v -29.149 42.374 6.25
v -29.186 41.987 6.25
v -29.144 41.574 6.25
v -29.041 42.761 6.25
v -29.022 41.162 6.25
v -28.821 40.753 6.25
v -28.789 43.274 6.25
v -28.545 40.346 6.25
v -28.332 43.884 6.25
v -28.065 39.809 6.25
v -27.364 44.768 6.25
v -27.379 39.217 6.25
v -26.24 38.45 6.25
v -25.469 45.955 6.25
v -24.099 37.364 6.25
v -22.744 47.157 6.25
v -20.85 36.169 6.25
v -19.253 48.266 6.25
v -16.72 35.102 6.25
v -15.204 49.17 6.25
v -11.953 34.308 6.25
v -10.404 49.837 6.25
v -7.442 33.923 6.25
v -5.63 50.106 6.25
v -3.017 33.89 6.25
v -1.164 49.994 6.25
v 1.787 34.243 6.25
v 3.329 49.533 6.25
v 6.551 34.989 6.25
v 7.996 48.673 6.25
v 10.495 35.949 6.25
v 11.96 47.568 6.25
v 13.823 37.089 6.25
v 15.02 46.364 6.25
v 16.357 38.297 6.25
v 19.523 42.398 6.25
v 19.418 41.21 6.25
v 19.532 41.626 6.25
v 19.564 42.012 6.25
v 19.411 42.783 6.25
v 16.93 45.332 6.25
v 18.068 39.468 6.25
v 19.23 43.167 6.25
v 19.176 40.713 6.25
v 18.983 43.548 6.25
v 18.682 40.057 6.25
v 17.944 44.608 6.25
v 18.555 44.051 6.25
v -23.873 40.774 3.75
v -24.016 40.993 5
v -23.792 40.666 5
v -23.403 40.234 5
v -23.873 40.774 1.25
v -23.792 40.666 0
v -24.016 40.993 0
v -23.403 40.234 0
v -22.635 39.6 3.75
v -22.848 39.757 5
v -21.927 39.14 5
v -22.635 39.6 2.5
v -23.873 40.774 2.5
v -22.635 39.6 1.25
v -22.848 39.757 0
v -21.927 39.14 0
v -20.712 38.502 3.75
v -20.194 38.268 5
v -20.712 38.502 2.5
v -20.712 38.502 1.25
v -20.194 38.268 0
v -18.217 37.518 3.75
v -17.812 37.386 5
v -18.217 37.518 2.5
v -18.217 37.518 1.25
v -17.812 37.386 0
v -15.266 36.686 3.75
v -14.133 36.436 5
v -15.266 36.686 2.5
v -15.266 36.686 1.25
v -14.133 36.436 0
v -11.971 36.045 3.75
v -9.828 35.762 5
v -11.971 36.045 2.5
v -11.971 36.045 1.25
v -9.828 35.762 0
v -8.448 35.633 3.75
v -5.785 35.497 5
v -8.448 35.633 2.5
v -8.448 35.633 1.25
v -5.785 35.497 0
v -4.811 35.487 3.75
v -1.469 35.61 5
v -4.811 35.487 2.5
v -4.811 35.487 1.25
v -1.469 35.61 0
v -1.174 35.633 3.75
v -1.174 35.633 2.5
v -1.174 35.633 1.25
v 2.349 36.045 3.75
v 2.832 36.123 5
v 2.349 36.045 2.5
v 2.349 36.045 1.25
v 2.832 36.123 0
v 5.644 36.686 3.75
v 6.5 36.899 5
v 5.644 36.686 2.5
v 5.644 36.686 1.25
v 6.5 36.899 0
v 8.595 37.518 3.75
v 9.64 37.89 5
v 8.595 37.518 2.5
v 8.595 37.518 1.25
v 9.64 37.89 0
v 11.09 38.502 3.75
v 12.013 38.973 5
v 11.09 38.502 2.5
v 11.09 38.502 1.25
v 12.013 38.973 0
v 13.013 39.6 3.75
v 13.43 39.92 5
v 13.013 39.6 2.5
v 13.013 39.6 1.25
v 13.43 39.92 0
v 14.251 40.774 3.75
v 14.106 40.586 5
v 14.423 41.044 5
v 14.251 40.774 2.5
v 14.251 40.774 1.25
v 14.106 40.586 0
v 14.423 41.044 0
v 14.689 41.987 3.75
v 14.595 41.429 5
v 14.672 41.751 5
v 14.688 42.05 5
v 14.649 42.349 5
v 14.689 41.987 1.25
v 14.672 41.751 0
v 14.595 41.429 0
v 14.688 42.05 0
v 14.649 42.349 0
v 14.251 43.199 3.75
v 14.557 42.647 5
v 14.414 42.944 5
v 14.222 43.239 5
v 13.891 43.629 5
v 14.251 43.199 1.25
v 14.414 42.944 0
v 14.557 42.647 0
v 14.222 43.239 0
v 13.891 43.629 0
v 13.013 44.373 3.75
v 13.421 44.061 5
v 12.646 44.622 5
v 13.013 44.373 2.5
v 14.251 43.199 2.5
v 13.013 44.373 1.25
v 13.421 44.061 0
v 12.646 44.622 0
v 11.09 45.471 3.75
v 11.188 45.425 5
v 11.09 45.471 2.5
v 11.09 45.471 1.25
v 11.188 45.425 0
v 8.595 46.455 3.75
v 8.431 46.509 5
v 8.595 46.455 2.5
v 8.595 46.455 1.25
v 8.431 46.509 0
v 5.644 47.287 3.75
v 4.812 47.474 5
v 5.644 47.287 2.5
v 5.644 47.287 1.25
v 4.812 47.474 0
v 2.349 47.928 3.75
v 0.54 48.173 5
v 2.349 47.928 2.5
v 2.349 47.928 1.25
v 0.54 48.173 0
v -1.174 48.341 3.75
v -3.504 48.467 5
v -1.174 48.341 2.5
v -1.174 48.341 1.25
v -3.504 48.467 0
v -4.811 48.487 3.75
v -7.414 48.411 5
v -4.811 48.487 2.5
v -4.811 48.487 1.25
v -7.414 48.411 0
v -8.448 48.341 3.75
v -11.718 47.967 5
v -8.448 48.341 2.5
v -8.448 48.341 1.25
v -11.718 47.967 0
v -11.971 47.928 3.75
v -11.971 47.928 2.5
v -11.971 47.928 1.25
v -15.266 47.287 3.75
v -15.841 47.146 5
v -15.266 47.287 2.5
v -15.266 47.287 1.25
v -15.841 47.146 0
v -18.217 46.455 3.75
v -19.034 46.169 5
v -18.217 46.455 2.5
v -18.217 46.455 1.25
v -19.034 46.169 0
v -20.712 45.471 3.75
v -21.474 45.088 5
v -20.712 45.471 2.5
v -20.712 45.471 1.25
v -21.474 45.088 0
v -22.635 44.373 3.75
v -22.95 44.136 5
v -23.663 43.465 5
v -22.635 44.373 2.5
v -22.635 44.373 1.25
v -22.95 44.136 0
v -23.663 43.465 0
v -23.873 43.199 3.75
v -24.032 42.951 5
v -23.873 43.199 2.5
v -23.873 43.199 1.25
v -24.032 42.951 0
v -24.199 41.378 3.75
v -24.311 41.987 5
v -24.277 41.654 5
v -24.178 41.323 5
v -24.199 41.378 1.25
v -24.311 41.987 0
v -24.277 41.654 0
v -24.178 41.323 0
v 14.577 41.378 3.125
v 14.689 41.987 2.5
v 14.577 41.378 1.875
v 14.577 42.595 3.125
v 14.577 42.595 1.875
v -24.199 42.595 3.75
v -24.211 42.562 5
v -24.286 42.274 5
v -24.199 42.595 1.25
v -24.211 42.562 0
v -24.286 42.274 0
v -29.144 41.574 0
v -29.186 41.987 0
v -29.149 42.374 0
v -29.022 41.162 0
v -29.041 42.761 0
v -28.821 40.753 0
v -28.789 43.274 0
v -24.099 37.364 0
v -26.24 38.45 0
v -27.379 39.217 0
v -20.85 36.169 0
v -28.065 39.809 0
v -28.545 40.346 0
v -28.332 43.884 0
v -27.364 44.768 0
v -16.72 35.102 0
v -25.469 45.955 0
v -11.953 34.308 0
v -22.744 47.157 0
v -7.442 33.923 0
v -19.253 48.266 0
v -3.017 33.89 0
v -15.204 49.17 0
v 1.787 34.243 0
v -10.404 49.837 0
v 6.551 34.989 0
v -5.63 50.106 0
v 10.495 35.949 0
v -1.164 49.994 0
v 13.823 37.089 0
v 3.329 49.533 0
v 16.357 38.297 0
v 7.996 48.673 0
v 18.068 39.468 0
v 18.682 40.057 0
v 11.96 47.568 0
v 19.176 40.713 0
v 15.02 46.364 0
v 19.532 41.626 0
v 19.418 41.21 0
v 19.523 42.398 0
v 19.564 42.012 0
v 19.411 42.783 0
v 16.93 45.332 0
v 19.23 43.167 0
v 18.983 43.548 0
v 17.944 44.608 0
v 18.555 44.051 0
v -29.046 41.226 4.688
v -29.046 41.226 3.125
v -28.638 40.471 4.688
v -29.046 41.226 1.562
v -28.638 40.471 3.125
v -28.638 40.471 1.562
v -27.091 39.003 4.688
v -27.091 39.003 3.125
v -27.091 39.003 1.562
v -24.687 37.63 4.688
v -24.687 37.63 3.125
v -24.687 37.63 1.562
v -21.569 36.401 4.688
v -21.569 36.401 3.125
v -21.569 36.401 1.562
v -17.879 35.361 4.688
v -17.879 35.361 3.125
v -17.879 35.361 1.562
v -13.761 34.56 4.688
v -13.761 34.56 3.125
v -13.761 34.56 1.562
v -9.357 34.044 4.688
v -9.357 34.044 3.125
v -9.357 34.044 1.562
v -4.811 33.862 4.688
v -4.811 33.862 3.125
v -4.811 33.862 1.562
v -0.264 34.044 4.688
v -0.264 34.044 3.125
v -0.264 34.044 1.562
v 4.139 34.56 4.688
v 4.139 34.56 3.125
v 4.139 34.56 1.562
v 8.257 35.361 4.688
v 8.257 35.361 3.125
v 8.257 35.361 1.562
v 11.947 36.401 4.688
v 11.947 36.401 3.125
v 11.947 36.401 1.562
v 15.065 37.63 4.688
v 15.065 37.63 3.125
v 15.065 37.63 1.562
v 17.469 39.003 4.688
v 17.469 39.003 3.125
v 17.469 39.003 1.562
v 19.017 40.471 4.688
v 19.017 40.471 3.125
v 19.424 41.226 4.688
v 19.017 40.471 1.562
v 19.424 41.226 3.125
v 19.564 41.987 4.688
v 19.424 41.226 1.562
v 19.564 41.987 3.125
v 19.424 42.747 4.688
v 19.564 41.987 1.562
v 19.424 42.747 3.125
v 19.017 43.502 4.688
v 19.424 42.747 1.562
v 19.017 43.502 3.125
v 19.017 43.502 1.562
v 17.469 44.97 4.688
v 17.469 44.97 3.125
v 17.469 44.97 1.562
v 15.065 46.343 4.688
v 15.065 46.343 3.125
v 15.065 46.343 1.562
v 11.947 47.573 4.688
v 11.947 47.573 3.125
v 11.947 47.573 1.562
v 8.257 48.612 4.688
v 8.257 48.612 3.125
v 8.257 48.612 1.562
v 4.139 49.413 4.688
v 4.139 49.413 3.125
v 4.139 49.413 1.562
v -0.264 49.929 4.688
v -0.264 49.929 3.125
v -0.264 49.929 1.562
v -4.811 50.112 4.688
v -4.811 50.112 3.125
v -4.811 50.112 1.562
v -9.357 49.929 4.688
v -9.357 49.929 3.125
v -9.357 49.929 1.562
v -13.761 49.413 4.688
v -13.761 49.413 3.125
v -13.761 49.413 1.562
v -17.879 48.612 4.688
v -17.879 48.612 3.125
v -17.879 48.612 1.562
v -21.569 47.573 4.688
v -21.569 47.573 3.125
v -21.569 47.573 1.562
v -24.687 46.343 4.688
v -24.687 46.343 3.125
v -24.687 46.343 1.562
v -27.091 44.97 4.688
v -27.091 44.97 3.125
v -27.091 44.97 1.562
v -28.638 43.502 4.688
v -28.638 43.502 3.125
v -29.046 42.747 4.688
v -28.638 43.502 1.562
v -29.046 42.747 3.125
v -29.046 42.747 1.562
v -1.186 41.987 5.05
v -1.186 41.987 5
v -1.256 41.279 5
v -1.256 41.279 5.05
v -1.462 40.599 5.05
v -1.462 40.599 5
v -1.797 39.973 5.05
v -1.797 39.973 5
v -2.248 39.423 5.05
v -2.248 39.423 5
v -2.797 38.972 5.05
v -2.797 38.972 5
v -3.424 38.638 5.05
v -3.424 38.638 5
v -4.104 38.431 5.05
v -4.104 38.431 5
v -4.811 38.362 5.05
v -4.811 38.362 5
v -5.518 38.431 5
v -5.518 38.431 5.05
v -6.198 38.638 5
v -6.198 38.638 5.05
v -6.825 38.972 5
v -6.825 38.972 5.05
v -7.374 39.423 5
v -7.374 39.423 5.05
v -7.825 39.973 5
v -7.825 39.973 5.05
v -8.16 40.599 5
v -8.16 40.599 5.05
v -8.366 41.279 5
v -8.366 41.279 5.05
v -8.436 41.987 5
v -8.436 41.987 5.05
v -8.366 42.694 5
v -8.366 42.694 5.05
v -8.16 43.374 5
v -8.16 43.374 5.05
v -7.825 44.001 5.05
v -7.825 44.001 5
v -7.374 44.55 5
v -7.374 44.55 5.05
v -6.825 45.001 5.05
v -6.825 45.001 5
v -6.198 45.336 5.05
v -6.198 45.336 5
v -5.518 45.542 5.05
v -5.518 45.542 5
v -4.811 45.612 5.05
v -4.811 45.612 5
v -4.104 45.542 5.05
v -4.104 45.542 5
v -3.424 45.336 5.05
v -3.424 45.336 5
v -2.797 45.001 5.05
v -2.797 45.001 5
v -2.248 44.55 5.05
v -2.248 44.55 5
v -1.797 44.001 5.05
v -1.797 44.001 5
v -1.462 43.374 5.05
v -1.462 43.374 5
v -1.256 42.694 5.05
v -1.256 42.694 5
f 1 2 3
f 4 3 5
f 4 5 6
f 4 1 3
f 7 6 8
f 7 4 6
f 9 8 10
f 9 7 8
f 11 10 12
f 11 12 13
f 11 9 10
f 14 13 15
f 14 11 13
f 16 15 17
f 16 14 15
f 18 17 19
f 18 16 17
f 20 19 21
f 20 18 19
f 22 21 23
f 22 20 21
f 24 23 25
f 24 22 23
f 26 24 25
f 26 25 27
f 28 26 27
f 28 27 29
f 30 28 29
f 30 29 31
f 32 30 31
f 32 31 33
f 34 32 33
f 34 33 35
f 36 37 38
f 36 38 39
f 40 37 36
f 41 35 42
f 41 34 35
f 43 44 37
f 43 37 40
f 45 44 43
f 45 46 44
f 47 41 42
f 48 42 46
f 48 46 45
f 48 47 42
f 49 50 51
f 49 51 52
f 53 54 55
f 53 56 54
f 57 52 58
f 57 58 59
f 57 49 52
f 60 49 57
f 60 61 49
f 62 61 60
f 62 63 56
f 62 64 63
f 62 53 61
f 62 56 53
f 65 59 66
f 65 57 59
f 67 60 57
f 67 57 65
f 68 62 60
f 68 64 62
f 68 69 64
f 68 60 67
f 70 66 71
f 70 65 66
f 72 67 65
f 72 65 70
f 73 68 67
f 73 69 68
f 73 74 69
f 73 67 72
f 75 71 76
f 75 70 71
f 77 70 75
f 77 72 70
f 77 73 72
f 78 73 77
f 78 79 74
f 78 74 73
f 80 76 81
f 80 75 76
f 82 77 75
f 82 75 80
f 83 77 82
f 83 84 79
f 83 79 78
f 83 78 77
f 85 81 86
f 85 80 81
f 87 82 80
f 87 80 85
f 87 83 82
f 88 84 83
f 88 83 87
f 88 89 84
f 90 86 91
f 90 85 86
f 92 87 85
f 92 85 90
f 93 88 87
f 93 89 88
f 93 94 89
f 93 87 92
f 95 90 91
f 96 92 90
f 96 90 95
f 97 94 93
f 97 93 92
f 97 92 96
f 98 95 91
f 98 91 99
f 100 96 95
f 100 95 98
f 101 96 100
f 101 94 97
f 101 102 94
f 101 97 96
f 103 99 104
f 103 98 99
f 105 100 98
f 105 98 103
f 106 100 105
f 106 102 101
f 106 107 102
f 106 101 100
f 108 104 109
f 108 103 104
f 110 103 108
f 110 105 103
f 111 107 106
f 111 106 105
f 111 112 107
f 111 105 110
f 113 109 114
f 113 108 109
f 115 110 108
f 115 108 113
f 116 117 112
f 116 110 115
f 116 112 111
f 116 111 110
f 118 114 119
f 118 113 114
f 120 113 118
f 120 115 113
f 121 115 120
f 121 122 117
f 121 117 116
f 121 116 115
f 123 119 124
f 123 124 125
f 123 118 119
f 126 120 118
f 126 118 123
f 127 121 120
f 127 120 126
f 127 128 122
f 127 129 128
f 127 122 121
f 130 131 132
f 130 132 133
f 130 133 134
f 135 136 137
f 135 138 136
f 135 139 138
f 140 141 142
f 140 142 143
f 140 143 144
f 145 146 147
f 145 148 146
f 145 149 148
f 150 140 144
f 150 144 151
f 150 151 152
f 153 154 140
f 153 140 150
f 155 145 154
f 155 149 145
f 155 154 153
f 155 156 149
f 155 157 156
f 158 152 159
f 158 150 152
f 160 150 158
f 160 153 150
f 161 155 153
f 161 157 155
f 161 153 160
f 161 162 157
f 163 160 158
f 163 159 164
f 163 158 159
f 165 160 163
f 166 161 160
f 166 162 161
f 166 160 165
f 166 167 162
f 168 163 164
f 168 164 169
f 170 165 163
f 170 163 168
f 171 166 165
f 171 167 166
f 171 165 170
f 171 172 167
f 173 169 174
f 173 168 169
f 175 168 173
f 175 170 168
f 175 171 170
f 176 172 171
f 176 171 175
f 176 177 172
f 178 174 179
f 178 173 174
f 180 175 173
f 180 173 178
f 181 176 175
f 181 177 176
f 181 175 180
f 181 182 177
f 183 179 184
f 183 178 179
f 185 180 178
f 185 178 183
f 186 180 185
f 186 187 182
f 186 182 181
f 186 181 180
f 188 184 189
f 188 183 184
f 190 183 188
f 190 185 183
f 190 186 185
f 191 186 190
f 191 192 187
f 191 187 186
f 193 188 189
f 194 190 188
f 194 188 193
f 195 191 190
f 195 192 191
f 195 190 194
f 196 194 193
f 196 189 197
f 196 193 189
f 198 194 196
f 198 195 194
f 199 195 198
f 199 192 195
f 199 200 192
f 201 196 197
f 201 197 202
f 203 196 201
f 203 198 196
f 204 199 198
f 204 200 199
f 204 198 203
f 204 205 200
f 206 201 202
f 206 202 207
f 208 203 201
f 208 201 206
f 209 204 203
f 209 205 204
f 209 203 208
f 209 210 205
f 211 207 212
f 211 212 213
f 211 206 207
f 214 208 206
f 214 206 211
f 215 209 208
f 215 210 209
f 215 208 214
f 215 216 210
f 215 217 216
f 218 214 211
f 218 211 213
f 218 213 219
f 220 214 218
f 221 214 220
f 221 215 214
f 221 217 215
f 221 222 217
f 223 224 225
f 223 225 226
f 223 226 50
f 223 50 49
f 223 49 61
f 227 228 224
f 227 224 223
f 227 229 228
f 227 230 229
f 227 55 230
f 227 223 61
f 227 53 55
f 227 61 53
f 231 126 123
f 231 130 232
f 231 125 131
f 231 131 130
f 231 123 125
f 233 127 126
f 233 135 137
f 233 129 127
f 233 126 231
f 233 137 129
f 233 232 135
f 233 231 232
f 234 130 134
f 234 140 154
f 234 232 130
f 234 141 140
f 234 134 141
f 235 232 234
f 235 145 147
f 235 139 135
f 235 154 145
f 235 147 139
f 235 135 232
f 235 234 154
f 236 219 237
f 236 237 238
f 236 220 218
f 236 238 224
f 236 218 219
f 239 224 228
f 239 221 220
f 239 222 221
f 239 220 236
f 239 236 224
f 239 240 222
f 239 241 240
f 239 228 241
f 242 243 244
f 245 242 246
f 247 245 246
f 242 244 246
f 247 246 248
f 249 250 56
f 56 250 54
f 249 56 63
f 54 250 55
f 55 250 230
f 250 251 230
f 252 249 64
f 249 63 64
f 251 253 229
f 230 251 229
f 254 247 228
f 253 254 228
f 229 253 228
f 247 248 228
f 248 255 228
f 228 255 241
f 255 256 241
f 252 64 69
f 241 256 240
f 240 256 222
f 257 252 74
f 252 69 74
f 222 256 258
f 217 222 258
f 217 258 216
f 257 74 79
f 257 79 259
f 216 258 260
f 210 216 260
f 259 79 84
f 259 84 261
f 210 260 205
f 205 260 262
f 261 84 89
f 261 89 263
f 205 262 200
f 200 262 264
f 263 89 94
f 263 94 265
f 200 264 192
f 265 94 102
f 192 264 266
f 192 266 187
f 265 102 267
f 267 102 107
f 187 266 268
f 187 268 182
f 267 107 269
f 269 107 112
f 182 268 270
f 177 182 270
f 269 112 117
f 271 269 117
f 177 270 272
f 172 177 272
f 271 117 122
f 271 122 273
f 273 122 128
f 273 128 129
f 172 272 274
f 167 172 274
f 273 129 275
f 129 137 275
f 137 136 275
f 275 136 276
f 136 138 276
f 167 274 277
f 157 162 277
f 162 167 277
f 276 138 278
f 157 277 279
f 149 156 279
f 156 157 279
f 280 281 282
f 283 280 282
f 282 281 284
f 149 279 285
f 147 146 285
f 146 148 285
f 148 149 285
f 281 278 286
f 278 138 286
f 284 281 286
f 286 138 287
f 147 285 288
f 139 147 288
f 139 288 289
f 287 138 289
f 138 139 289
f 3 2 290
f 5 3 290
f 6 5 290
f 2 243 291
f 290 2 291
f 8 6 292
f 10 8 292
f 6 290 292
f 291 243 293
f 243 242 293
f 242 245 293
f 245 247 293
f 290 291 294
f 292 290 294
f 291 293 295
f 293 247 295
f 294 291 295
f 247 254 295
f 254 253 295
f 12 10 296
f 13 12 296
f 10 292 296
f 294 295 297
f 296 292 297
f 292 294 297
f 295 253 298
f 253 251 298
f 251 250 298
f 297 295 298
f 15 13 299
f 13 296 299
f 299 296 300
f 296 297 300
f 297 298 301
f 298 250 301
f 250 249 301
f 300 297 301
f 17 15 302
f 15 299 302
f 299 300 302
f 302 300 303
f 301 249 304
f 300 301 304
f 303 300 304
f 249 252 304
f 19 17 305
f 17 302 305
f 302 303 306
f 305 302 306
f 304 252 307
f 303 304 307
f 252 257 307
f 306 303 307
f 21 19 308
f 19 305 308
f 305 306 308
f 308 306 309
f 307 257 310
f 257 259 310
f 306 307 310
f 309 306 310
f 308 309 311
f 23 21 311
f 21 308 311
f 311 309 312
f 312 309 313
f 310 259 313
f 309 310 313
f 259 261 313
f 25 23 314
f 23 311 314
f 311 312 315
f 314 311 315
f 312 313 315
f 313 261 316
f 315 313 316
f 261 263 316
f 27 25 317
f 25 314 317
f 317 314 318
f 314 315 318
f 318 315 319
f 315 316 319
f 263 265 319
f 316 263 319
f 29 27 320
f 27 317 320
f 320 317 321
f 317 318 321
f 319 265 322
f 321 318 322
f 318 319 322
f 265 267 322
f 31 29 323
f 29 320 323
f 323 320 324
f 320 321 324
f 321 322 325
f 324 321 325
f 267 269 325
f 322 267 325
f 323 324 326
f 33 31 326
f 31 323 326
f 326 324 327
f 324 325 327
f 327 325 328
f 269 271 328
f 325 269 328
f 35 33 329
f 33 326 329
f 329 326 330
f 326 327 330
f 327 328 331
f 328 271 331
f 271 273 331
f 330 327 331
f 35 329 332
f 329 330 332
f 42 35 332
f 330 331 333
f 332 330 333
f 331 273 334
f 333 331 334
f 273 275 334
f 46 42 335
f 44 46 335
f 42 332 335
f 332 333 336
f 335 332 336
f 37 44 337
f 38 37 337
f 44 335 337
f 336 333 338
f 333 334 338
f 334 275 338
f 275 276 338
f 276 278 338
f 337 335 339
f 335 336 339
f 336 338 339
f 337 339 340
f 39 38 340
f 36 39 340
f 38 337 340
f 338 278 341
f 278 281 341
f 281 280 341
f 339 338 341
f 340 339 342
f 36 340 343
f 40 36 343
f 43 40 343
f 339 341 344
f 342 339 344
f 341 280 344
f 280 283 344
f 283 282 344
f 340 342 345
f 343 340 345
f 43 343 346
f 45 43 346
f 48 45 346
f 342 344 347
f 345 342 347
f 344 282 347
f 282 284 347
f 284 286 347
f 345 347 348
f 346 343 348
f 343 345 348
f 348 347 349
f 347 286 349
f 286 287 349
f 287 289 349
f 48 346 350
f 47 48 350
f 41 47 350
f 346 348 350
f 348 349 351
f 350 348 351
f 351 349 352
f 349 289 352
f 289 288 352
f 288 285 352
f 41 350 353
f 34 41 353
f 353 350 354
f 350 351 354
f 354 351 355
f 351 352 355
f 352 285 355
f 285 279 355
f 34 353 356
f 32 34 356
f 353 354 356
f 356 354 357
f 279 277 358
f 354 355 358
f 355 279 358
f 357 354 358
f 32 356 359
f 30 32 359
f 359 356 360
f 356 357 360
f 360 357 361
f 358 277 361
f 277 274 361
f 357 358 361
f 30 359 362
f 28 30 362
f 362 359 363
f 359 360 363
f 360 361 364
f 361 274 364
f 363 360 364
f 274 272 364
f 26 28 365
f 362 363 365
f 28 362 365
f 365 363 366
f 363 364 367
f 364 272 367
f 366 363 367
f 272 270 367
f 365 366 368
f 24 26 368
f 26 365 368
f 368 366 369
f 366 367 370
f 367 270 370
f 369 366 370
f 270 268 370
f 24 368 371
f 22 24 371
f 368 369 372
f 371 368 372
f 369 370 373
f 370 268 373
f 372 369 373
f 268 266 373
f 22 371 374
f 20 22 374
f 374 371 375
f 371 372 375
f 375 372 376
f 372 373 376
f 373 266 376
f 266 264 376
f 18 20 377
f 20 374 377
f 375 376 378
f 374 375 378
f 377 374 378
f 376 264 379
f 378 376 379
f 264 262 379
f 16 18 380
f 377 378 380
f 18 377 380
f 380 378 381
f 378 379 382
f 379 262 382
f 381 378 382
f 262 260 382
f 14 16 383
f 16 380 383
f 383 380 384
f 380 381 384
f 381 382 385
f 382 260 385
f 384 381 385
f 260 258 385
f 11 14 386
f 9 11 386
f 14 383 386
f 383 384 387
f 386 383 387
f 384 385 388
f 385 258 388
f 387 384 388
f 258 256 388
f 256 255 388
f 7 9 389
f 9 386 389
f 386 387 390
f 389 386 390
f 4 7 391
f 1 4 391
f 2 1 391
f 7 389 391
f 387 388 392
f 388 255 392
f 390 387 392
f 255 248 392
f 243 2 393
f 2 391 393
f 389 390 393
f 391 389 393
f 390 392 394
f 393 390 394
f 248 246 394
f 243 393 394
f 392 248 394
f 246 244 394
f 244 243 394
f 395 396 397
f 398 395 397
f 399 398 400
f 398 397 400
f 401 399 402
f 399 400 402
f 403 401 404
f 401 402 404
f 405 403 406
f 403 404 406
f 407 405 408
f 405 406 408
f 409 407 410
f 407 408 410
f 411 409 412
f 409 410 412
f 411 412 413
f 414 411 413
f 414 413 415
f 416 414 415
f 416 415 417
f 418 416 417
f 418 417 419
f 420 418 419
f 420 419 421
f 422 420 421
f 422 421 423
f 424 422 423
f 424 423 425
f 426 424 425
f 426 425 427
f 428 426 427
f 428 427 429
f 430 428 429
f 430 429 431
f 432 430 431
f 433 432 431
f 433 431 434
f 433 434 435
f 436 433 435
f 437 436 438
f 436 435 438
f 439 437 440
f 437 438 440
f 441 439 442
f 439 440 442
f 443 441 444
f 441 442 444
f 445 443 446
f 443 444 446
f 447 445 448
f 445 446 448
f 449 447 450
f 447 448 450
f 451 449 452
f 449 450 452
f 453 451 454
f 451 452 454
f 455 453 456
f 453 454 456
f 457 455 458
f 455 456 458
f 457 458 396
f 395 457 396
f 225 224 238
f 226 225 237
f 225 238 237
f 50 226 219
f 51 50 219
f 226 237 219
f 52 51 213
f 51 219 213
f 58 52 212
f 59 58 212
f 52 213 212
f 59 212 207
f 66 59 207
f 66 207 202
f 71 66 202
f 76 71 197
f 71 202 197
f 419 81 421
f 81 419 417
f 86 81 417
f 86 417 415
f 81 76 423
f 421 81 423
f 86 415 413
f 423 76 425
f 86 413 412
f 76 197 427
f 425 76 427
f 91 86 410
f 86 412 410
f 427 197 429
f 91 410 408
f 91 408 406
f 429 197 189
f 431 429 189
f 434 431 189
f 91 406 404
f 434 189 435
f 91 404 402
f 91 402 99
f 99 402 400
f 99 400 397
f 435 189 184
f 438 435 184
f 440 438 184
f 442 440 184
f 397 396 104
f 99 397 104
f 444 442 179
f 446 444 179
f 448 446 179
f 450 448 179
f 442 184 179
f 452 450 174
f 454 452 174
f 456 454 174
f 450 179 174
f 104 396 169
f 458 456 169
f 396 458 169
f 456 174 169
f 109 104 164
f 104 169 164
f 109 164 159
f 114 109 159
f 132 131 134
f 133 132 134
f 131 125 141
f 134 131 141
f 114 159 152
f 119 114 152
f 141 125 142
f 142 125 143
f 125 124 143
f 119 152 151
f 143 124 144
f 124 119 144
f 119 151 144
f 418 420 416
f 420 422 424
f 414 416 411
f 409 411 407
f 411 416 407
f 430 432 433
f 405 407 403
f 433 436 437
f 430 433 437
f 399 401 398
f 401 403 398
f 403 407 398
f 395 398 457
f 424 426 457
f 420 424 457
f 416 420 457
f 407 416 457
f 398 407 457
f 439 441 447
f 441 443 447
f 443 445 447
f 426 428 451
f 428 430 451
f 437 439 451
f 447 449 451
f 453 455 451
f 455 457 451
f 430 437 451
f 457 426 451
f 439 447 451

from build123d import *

# Parameters (mm, degrees)
F1_DEPTH  = 5
F2_SCALE  = 1.25
F11_R     = 3.625
F13_DEPTH = 3.25
F15_R     = 4.297586673
F16_DEPTH = 1.2


# Not quite as in the source:
# - a feature of the source that left no trace in its solid (it failed there, or was rolled back) is left out


with BuildPart() as f1:
    # F0 (on Top) → F1 (new body)
    with BuildSketch(Plane.XY):
        with BuildLine():
            Line((-19.5, 0), (0, 0))
            Line((0, 0), (0, 6.5))
            add(Edge.make_bspline(
                [(-19.5, 0), (-19.5, 3.25), (-9.75, 6.5), (0, 6.5)],
                knots=[0, 0, 0, 0, 0.25, 0.25, 0.25, 0.25], degree=3))
        make_face()
        with BuildLine():
            Line((0, 6.5), (0, 0))
            Line((0, 0), (19.5, 0))
            add(Edge.make_bspline(
                [(0, 6.5), (9.75, 6.5), (19.5, 3.25), (19.5, 0)],
                knots=[0.25, 0.25, 0.25, 0.25, 0.5, 0.5, 0.5, 0.5], degree=3))
        make_face()
        with BuildLine():
            Line((19.5, 0), (0, 0))
            Line((0, 0), (0, -6.5))
            add(Edge.make_bspline(
                [(19.5, 0), (19.5, -3.25), (9.75, -6.5), (0, -6.5)],
                knots=[0.5, 0.5, 0.5, 0.5, 0.75, 0.75, 0.75, 0.75], degree=3))
        make_face()
        with BuildLine():
            Line((0, -6.5), (0, 0))
            Line((0, 0), (-19.5, 0))
            add(Edge.make_bspline(
                [(0, -6.5), (-9.75, -6.5), (-19.5, -3.25), (-19.5, 0)],
                knots=[0.75, 0.75, 0.75, 0.75, 1, 1, 1, 1], degree=3))
        make_face()
    extrude(amount=F1_DEPTH)


with BuildPart() as f2_1:
    # F2: copy of F1
    add(f1.part.scale(F2_SCALE))

    # F5: cut F1
    add(f1.part, mode=Mode.SUBTRACT)

    # F11 (on face) → F13 (cut)
    with BuildSketch(Plane(origin=(0, 0, 5), x_dir=(1, 0, 0), z_dir=(0, 0, -1))):
        Circle(F11_R)
    extrude(amount=-F13_DEPTH, mode=Mode.SUBTRACT)


with BuildPart() as f14_1:
    # F14: copy of F2_1
    add(f2_1.part.moved(Location((-4.8109386116, 41.9865772128, 0))))

    # F15 (on face) → F16 (join)
    with BuildSketch(Plane.XY.offset(6.25)):
        with Locations((-4.8109386116, 41.9865772128)):
            Circle(F15_R)
    extrude(amount=-F16_DEPTH)


with BuildPart() as f17_1:
    # F17: copy of F14_1
    add(f14_1.part)


solid = f14_1.part
